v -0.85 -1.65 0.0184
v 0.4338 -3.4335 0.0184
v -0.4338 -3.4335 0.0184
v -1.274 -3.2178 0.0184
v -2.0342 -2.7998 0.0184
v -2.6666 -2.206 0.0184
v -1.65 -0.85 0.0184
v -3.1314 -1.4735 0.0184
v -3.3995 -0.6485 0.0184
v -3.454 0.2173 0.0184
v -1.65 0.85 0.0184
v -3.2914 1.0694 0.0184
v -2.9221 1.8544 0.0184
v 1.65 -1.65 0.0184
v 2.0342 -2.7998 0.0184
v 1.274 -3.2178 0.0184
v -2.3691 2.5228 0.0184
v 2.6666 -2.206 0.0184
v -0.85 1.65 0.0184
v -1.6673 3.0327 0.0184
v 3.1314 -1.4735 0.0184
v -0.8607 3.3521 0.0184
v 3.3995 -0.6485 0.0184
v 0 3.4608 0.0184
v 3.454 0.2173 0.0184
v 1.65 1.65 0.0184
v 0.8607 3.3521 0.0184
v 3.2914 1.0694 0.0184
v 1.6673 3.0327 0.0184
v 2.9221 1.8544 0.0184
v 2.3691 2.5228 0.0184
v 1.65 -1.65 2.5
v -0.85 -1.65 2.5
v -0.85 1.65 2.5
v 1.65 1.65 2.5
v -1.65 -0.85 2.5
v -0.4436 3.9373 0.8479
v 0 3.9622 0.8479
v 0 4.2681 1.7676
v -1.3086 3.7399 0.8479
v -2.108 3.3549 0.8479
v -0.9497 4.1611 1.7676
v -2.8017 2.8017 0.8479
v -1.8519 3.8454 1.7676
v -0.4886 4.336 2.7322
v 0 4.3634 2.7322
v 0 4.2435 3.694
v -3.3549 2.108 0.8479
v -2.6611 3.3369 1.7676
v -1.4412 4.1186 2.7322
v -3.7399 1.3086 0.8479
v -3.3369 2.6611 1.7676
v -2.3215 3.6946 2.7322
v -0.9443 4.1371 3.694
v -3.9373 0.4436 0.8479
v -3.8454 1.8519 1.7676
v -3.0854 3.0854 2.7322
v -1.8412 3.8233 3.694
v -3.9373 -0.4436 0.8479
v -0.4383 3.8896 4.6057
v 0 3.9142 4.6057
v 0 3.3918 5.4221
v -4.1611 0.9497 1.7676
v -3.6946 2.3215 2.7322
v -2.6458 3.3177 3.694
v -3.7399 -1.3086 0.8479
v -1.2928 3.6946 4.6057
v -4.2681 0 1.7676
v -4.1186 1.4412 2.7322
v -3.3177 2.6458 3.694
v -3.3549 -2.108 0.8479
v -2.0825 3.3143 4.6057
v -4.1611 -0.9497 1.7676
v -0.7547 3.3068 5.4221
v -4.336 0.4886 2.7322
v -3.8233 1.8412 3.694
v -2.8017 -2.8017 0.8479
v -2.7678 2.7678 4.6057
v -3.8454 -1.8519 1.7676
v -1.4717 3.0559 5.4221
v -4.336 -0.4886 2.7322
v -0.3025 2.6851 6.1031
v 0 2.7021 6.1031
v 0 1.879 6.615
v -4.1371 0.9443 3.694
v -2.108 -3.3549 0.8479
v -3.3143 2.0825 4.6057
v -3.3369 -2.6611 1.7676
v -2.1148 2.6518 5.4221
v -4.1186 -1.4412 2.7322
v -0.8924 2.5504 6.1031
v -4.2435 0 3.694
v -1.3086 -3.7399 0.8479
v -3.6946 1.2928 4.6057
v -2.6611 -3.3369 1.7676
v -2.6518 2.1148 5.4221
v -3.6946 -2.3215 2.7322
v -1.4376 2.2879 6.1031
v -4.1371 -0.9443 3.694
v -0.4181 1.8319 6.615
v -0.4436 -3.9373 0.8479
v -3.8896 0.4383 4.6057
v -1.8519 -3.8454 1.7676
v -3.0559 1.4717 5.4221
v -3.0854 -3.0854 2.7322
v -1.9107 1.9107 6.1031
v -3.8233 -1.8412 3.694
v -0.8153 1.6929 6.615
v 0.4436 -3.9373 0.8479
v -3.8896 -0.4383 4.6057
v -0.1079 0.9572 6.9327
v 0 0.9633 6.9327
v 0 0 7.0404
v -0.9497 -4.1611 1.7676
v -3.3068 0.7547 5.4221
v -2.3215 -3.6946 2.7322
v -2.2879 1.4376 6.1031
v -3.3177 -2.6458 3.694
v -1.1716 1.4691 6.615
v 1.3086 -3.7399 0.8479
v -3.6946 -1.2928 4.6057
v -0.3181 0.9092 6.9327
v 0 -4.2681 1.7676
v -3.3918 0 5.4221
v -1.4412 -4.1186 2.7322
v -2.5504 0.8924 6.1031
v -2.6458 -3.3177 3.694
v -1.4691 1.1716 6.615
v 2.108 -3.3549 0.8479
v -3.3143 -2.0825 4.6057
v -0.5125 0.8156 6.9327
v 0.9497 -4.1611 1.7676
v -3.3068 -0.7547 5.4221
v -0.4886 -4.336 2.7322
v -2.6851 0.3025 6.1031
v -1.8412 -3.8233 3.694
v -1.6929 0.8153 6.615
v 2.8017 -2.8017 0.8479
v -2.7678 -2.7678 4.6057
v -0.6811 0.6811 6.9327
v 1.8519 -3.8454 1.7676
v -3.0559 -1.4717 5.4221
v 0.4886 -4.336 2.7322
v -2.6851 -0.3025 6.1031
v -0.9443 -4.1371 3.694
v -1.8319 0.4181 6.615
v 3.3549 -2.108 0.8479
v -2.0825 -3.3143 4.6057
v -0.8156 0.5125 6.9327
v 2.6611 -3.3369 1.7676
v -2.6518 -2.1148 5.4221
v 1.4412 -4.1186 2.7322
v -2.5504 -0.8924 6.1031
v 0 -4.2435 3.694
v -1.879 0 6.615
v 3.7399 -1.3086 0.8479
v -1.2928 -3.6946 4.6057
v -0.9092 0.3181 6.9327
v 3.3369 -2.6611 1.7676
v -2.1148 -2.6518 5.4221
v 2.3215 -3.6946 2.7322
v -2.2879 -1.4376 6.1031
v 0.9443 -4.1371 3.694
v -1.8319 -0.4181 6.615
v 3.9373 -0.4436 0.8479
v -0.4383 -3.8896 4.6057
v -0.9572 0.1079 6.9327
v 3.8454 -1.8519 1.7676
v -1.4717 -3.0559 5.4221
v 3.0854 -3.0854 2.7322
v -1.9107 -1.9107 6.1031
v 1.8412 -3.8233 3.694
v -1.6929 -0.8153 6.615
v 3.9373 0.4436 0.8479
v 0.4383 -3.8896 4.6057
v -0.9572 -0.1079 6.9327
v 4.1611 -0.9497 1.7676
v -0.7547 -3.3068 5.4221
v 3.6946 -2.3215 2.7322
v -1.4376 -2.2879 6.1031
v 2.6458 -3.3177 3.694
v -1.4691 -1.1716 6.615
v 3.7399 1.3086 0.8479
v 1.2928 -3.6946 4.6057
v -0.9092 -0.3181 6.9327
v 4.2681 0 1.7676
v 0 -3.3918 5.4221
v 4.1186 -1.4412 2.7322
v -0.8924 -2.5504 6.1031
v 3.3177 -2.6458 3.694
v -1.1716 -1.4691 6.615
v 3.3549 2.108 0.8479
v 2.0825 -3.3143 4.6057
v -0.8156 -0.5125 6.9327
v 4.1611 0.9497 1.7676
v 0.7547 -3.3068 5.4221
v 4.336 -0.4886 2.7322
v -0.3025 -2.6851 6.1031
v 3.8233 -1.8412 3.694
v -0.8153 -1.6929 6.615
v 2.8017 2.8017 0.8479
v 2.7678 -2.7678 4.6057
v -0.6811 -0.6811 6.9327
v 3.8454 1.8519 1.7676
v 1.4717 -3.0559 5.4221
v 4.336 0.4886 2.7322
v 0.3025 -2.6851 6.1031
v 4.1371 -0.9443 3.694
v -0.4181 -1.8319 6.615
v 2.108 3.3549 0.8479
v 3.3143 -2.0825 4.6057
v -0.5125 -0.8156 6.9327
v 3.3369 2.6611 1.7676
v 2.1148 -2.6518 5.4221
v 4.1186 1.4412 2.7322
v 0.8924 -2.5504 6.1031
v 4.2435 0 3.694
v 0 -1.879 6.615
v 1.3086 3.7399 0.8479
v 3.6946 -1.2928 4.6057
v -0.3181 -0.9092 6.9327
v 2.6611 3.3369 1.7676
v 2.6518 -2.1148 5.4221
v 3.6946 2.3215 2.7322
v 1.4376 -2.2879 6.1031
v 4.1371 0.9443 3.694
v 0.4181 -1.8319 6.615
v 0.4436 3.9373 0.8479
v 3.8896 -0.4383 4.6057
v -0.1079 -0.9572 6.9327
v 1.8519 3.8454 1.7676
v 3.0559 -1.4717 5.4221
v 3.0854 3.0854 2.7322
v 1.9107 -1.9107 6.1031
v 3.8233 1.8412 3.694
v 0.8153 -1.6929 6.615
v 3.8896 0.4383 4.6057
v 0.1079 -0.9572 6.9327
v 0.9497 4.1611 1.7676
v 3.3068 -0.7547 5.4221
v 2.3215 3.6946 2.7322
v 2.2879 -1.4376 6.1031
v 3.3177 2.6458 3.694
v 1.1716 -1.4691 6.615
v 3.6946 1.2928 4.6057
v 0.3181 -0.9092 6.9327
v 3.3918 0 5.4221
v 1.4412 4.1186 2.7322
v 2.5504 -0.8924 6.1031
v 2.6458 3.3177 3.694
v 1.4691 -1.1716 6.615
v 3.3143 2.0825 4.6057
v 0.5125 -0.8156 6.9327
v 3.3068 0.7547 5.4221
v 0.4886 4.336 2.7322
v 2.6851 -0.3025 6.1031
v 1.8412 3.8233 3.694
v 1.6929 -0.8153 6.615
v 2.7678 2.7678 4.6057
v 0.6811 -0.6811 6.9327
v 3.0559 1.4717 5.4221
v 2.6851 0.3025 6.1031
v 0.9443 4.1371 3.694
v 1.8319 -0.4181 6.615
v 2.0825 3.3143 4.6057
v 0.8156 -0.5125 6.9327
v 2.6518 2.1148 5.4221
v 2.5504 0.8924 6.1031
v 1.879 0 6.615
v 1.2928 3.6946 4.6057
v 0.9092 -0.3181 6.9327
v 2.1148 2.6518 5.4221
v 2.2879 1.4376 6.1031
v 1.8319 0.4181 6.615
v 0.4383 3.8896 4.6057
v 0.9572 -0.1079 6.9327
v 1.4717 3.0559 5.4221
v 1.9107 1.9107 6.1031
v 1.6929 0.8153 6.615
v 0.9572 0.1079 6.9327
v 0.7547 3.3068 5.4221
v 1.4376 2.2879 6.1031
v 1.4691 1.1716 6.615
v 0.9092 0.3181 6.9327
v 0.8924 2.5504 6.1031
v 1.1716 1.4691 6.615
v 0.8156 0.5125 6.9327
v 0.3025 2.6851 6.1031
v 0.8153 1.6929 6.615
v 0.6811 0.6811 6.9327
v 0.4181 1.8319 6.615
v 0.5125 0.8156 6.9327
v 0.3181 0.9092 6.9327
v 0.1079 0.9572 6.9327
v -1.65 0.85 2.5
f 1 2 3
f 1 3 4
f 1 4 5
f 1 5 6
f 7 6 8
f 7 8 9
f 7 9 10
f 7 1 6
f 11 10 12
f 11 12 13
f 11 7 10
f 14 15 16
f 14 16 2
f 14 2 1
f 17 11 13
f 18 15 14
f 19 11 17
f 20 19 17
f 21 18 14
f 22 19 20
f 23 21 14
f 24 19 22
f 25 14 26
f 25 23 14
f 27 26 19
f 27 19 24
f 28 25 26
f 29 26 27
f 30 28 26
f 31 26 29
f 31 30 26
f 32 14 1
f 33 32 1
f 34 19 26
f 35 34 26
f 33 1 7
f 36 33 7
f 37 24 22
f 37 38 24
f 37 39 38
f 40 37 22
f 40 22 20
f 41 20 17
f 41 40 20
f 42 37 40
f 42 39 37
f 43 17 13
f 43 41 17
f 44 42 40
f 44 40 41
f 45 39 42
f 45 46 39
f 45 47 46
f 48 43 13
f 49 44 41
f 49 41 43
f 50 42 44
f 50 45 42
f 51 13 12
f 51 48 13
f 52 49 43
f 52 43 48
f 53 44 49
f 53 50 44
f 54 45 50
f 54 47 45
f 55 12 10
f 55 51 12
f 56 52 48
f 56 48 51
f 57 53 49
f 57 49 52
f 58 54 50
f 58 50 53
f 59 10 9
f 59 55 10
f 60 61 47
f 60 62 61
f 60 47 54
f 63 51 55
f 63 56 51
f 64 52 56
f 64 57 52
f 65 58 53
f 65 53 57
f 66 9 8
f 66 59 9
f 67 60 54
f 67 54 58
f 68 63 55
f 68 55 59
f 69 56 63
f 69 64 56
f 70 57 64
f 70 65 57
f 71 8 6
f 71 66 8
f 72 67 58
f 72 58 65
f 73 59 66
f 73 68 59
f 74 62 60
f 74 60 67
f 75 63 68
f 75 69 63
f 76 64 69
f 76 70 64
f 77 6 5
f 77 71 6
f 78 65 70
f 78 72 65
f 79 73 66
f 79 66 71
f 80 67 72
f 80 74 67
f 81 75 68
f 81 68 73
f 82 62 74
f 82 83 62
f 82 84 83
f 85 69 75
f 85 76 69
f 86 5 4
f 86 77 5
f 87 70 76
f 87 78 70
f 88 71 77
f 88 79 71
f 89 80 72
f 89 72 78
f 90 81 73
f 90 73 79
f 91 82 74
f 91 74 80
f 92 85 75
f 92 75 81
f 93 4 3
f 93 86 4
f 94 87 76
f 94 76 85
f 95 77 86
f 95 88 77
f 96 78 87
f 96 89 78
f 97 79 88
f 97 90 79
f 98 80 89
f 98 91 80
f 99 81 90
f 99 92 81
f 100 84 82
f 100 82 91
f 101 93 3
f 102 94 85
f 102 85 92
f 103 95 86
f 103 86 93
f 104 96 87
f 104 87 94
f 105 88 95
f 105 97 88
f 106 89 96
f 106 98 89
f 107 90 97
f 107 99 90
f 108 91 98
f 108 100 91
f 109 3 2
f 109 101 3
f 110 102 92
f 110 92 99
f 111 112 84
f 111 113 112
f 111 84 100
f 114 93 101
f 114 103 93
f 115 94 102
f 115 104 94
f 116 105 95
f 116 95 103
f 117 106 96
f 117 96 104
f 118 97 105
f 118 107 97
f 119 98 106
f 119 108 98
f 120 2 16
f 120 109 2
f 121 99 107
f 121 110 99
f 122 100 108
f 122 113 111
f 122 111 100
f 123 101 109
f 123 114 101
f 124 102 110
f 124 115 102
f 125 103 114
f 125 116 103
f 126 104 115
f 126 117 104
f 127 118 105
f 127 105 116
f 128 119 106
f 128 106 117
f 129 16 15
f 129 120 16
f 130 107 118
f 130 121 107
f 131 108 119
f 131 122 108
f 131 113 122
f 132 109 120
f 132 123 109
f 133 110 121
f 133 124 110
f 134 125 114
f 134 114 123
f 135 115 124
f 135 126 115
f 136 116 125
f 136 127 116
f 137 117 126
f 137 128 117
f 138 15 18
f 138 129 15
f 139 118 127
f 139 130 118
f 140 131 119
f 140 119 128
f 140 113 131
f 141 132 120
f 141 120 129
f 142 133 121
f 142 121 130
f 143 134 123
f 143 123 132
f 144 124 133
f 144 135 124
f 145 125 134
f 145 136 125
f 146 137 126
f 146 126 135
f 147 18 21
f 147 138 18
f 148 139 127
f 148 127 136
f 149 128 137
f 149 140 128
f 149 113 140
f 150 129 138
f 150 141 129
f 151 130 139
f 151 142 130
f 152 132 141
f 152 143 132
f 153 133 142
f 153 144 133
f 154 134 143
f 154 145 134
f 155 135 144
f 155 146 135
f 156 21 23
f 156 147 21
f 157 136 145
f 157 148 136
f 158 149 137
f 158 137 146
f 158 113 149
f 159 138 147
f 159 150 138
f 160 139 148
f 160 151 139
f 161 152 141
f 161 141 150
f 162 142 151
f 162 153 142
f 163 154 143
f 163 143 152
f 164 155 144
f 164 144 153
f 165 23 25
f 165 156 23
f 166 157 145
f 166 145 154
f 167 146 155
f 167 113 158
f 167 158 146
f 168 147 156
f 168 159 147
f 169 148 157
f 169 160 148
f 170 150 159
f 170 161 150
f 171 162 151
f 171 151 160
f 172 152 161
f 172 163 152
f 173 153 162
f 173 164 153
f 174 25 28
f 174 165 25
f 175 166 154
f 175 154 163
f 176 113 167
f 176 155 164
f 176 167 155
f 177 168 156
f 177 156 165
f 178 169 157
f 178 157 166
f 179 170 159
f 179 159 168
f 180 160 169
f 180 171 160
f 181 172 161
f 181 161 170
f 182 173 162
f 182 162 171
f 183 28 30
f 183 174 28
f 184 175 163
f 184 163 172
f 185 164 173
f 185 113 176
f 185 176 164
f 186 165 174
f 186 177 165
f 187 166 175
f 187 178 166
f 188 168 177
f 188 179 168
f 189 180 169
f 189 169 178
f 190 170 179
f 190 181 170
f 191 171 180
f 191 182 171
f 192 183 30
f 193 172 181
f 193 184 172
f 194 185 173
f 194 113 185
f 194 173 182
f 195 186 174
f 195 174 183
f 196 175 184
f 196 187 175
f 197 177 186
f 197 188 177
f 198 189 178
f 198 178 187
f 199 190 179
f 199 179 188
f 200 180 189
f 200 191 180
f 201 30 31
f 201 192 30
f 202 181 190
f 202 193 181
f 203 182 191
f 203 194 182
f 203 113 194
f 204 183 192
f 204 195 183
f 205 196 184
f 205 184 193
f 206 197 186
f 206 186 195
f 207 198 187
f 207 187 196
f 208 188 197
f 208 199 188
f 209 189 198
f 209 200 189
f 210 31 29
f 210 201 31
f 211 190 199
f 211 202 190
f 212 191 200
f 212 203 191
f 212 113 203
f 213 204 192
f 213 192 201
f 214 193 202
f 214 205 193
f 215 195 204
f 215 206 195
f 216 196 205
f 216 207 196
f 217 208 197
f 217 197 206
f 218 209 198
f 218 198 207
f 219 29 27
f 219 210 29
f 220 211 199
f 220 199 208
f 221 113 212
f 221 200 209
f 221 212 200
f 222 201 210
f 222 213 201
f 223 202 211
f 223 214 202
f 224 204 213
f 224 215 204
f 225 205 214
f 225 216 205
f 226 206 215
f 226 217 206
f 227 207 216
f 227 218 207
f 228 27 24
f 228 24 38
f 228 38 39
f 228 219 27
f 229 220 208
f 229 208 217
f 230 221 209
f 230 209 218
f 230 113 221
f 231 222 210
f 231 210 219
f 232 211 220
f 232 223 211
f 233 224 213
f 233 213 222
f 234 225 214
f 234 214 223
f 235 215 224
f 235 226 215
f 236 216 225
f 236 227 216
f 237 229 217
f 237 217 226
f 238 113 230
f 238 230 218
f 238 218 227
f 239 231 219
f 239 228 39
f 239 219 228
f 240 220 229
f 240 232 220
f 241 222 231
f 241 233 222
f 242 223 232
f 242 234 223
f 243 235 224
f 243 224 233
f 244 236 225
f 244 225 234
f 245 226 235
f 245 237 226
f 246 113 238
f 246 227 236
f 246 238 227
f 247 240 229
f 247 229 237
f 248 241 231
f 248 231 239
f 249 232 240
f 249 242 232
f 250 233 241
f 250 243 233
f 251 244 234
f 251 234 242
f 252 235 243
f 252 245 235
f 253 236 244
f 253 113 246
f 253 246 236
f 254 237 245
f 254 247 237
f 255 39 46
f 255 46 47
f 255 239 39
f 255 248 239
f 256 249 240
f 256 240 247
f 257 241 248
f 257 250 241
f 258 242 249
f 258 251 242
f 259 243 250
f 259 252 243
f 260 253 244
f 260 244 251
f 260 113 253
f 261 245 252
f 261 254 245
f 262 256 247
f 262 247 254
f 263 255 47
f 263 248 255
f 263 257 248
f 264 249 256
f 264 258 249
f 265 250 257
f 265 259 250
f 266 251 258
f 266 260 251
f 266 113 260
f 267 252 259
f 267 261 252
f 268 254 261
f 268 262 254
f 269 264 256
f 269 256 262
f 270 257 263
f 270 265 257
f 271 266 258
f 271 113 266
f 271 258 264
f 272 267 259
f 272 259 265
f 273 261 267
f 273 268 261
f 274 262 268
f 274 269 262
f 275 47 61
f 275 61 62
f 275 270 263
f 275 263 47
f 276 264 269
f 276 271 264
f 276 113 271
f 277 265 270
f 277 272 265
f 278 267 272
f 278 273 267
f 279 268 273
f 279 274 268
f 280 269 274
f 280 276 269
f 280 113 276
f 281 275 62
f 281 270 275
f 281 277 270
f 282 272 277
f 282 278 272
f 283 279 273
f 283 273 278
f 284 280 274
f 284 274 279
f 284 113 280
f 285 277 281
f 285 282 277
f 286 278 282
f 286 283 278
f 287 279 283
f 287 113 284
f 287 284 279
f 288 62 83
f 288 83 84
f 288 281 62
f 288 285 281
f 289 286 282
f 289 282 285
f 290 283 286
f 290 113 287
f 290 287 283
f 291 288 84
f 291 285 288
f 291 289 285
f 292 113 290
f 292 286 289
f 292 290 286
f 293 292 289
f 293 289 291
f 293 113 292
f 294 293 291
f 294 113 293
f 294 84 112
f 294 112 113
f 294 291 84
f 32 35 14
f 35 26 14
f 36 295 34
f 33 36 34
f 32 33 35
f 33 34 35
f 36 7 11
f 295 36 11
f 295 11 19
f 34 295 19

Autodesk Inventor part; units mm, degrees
ref_plane "Work Plane1" through (0, 0, 0) normal (1, 0, 0) x (0, 0, -1)
sketch "Sketch3" plane through (0, 0, 0) normal (1, 0, 0) x (0, 0, -1)
  circle A0 centre (-2.6765, 0) radius 4.3638
  line L0 (-7.0404, 0) -> (1.6873, 0)
  line L1 (-0.0184, 0) -> (-0.0184, 3.4608)
  point P0 (0, 0)
ref_plane "Work Plane2" through (-0.85, -1.65, 0) normal (0, 0, 1) x (1, 0, 0)
sketch "Sketch5" plane through (-0.85, -1.65, 0) normal (0, 0, 1) x (1, 0, 0)
  line L0 (-0.8, 2.5) -> (0, 3.3) projected
  line L1 (-0.8, 0.8) -> (-0.8, 2.5) projected
  line L2 (0, 0) -> (-0.8, 0.8) projected
  line L3 (2.5, 0) -> (0, 0) projected
  line L4 (2.5, 3.3) -> (2.5, 0) projected
  line L5 (0, 3.3) -> (2.5, 3.3) projected
  circle A0 centre (0.85, 1.65) radius 1.25 projected
revolve "Revolution2" add sketch "Sketch3" angle 360 about axis through (0, 0, 7.0404) along (0, 0, -1) picked at (-4.6554, 0.3561) contours L1 L0 A0
ref_plane "Work Plane3" through (-0.85, -1.65, 0) normal (0, 0, 1) x (1, 0, 0)
sketch "Sketch6" plane through (-0.85, -1.65, 0) normal (0, 0, 1) x (1, 0, 0)
  line L0 (0.85, 8.4832) -> (0.85, -5.1832) projected
  line L1 (-0.8, 2.5) -> (0, 3.3) projected
  line L2 (-0.8, 0.8) -> (-0.8, 2.5) projected
  line L3 (0, 0) -> (-0.8, 0.8) projected
  line L4 (2.5, 0) -> (0, 0) projected
  line L5 (2.5, 3.3) -> (2.5, 0) projected
  line L6 (0, 3.3) -> (2.5, 3.3) projected
  circle A0 centre (0.85, 1.65) radius 1.25 projected
  circle A1 centre (0.85, 1.65) radius 1.25 projected
extrude "Extrusion2" cut sketch "Sketch6" along normal blind 2.5
properties part number "JS5210_hat_top_1"
